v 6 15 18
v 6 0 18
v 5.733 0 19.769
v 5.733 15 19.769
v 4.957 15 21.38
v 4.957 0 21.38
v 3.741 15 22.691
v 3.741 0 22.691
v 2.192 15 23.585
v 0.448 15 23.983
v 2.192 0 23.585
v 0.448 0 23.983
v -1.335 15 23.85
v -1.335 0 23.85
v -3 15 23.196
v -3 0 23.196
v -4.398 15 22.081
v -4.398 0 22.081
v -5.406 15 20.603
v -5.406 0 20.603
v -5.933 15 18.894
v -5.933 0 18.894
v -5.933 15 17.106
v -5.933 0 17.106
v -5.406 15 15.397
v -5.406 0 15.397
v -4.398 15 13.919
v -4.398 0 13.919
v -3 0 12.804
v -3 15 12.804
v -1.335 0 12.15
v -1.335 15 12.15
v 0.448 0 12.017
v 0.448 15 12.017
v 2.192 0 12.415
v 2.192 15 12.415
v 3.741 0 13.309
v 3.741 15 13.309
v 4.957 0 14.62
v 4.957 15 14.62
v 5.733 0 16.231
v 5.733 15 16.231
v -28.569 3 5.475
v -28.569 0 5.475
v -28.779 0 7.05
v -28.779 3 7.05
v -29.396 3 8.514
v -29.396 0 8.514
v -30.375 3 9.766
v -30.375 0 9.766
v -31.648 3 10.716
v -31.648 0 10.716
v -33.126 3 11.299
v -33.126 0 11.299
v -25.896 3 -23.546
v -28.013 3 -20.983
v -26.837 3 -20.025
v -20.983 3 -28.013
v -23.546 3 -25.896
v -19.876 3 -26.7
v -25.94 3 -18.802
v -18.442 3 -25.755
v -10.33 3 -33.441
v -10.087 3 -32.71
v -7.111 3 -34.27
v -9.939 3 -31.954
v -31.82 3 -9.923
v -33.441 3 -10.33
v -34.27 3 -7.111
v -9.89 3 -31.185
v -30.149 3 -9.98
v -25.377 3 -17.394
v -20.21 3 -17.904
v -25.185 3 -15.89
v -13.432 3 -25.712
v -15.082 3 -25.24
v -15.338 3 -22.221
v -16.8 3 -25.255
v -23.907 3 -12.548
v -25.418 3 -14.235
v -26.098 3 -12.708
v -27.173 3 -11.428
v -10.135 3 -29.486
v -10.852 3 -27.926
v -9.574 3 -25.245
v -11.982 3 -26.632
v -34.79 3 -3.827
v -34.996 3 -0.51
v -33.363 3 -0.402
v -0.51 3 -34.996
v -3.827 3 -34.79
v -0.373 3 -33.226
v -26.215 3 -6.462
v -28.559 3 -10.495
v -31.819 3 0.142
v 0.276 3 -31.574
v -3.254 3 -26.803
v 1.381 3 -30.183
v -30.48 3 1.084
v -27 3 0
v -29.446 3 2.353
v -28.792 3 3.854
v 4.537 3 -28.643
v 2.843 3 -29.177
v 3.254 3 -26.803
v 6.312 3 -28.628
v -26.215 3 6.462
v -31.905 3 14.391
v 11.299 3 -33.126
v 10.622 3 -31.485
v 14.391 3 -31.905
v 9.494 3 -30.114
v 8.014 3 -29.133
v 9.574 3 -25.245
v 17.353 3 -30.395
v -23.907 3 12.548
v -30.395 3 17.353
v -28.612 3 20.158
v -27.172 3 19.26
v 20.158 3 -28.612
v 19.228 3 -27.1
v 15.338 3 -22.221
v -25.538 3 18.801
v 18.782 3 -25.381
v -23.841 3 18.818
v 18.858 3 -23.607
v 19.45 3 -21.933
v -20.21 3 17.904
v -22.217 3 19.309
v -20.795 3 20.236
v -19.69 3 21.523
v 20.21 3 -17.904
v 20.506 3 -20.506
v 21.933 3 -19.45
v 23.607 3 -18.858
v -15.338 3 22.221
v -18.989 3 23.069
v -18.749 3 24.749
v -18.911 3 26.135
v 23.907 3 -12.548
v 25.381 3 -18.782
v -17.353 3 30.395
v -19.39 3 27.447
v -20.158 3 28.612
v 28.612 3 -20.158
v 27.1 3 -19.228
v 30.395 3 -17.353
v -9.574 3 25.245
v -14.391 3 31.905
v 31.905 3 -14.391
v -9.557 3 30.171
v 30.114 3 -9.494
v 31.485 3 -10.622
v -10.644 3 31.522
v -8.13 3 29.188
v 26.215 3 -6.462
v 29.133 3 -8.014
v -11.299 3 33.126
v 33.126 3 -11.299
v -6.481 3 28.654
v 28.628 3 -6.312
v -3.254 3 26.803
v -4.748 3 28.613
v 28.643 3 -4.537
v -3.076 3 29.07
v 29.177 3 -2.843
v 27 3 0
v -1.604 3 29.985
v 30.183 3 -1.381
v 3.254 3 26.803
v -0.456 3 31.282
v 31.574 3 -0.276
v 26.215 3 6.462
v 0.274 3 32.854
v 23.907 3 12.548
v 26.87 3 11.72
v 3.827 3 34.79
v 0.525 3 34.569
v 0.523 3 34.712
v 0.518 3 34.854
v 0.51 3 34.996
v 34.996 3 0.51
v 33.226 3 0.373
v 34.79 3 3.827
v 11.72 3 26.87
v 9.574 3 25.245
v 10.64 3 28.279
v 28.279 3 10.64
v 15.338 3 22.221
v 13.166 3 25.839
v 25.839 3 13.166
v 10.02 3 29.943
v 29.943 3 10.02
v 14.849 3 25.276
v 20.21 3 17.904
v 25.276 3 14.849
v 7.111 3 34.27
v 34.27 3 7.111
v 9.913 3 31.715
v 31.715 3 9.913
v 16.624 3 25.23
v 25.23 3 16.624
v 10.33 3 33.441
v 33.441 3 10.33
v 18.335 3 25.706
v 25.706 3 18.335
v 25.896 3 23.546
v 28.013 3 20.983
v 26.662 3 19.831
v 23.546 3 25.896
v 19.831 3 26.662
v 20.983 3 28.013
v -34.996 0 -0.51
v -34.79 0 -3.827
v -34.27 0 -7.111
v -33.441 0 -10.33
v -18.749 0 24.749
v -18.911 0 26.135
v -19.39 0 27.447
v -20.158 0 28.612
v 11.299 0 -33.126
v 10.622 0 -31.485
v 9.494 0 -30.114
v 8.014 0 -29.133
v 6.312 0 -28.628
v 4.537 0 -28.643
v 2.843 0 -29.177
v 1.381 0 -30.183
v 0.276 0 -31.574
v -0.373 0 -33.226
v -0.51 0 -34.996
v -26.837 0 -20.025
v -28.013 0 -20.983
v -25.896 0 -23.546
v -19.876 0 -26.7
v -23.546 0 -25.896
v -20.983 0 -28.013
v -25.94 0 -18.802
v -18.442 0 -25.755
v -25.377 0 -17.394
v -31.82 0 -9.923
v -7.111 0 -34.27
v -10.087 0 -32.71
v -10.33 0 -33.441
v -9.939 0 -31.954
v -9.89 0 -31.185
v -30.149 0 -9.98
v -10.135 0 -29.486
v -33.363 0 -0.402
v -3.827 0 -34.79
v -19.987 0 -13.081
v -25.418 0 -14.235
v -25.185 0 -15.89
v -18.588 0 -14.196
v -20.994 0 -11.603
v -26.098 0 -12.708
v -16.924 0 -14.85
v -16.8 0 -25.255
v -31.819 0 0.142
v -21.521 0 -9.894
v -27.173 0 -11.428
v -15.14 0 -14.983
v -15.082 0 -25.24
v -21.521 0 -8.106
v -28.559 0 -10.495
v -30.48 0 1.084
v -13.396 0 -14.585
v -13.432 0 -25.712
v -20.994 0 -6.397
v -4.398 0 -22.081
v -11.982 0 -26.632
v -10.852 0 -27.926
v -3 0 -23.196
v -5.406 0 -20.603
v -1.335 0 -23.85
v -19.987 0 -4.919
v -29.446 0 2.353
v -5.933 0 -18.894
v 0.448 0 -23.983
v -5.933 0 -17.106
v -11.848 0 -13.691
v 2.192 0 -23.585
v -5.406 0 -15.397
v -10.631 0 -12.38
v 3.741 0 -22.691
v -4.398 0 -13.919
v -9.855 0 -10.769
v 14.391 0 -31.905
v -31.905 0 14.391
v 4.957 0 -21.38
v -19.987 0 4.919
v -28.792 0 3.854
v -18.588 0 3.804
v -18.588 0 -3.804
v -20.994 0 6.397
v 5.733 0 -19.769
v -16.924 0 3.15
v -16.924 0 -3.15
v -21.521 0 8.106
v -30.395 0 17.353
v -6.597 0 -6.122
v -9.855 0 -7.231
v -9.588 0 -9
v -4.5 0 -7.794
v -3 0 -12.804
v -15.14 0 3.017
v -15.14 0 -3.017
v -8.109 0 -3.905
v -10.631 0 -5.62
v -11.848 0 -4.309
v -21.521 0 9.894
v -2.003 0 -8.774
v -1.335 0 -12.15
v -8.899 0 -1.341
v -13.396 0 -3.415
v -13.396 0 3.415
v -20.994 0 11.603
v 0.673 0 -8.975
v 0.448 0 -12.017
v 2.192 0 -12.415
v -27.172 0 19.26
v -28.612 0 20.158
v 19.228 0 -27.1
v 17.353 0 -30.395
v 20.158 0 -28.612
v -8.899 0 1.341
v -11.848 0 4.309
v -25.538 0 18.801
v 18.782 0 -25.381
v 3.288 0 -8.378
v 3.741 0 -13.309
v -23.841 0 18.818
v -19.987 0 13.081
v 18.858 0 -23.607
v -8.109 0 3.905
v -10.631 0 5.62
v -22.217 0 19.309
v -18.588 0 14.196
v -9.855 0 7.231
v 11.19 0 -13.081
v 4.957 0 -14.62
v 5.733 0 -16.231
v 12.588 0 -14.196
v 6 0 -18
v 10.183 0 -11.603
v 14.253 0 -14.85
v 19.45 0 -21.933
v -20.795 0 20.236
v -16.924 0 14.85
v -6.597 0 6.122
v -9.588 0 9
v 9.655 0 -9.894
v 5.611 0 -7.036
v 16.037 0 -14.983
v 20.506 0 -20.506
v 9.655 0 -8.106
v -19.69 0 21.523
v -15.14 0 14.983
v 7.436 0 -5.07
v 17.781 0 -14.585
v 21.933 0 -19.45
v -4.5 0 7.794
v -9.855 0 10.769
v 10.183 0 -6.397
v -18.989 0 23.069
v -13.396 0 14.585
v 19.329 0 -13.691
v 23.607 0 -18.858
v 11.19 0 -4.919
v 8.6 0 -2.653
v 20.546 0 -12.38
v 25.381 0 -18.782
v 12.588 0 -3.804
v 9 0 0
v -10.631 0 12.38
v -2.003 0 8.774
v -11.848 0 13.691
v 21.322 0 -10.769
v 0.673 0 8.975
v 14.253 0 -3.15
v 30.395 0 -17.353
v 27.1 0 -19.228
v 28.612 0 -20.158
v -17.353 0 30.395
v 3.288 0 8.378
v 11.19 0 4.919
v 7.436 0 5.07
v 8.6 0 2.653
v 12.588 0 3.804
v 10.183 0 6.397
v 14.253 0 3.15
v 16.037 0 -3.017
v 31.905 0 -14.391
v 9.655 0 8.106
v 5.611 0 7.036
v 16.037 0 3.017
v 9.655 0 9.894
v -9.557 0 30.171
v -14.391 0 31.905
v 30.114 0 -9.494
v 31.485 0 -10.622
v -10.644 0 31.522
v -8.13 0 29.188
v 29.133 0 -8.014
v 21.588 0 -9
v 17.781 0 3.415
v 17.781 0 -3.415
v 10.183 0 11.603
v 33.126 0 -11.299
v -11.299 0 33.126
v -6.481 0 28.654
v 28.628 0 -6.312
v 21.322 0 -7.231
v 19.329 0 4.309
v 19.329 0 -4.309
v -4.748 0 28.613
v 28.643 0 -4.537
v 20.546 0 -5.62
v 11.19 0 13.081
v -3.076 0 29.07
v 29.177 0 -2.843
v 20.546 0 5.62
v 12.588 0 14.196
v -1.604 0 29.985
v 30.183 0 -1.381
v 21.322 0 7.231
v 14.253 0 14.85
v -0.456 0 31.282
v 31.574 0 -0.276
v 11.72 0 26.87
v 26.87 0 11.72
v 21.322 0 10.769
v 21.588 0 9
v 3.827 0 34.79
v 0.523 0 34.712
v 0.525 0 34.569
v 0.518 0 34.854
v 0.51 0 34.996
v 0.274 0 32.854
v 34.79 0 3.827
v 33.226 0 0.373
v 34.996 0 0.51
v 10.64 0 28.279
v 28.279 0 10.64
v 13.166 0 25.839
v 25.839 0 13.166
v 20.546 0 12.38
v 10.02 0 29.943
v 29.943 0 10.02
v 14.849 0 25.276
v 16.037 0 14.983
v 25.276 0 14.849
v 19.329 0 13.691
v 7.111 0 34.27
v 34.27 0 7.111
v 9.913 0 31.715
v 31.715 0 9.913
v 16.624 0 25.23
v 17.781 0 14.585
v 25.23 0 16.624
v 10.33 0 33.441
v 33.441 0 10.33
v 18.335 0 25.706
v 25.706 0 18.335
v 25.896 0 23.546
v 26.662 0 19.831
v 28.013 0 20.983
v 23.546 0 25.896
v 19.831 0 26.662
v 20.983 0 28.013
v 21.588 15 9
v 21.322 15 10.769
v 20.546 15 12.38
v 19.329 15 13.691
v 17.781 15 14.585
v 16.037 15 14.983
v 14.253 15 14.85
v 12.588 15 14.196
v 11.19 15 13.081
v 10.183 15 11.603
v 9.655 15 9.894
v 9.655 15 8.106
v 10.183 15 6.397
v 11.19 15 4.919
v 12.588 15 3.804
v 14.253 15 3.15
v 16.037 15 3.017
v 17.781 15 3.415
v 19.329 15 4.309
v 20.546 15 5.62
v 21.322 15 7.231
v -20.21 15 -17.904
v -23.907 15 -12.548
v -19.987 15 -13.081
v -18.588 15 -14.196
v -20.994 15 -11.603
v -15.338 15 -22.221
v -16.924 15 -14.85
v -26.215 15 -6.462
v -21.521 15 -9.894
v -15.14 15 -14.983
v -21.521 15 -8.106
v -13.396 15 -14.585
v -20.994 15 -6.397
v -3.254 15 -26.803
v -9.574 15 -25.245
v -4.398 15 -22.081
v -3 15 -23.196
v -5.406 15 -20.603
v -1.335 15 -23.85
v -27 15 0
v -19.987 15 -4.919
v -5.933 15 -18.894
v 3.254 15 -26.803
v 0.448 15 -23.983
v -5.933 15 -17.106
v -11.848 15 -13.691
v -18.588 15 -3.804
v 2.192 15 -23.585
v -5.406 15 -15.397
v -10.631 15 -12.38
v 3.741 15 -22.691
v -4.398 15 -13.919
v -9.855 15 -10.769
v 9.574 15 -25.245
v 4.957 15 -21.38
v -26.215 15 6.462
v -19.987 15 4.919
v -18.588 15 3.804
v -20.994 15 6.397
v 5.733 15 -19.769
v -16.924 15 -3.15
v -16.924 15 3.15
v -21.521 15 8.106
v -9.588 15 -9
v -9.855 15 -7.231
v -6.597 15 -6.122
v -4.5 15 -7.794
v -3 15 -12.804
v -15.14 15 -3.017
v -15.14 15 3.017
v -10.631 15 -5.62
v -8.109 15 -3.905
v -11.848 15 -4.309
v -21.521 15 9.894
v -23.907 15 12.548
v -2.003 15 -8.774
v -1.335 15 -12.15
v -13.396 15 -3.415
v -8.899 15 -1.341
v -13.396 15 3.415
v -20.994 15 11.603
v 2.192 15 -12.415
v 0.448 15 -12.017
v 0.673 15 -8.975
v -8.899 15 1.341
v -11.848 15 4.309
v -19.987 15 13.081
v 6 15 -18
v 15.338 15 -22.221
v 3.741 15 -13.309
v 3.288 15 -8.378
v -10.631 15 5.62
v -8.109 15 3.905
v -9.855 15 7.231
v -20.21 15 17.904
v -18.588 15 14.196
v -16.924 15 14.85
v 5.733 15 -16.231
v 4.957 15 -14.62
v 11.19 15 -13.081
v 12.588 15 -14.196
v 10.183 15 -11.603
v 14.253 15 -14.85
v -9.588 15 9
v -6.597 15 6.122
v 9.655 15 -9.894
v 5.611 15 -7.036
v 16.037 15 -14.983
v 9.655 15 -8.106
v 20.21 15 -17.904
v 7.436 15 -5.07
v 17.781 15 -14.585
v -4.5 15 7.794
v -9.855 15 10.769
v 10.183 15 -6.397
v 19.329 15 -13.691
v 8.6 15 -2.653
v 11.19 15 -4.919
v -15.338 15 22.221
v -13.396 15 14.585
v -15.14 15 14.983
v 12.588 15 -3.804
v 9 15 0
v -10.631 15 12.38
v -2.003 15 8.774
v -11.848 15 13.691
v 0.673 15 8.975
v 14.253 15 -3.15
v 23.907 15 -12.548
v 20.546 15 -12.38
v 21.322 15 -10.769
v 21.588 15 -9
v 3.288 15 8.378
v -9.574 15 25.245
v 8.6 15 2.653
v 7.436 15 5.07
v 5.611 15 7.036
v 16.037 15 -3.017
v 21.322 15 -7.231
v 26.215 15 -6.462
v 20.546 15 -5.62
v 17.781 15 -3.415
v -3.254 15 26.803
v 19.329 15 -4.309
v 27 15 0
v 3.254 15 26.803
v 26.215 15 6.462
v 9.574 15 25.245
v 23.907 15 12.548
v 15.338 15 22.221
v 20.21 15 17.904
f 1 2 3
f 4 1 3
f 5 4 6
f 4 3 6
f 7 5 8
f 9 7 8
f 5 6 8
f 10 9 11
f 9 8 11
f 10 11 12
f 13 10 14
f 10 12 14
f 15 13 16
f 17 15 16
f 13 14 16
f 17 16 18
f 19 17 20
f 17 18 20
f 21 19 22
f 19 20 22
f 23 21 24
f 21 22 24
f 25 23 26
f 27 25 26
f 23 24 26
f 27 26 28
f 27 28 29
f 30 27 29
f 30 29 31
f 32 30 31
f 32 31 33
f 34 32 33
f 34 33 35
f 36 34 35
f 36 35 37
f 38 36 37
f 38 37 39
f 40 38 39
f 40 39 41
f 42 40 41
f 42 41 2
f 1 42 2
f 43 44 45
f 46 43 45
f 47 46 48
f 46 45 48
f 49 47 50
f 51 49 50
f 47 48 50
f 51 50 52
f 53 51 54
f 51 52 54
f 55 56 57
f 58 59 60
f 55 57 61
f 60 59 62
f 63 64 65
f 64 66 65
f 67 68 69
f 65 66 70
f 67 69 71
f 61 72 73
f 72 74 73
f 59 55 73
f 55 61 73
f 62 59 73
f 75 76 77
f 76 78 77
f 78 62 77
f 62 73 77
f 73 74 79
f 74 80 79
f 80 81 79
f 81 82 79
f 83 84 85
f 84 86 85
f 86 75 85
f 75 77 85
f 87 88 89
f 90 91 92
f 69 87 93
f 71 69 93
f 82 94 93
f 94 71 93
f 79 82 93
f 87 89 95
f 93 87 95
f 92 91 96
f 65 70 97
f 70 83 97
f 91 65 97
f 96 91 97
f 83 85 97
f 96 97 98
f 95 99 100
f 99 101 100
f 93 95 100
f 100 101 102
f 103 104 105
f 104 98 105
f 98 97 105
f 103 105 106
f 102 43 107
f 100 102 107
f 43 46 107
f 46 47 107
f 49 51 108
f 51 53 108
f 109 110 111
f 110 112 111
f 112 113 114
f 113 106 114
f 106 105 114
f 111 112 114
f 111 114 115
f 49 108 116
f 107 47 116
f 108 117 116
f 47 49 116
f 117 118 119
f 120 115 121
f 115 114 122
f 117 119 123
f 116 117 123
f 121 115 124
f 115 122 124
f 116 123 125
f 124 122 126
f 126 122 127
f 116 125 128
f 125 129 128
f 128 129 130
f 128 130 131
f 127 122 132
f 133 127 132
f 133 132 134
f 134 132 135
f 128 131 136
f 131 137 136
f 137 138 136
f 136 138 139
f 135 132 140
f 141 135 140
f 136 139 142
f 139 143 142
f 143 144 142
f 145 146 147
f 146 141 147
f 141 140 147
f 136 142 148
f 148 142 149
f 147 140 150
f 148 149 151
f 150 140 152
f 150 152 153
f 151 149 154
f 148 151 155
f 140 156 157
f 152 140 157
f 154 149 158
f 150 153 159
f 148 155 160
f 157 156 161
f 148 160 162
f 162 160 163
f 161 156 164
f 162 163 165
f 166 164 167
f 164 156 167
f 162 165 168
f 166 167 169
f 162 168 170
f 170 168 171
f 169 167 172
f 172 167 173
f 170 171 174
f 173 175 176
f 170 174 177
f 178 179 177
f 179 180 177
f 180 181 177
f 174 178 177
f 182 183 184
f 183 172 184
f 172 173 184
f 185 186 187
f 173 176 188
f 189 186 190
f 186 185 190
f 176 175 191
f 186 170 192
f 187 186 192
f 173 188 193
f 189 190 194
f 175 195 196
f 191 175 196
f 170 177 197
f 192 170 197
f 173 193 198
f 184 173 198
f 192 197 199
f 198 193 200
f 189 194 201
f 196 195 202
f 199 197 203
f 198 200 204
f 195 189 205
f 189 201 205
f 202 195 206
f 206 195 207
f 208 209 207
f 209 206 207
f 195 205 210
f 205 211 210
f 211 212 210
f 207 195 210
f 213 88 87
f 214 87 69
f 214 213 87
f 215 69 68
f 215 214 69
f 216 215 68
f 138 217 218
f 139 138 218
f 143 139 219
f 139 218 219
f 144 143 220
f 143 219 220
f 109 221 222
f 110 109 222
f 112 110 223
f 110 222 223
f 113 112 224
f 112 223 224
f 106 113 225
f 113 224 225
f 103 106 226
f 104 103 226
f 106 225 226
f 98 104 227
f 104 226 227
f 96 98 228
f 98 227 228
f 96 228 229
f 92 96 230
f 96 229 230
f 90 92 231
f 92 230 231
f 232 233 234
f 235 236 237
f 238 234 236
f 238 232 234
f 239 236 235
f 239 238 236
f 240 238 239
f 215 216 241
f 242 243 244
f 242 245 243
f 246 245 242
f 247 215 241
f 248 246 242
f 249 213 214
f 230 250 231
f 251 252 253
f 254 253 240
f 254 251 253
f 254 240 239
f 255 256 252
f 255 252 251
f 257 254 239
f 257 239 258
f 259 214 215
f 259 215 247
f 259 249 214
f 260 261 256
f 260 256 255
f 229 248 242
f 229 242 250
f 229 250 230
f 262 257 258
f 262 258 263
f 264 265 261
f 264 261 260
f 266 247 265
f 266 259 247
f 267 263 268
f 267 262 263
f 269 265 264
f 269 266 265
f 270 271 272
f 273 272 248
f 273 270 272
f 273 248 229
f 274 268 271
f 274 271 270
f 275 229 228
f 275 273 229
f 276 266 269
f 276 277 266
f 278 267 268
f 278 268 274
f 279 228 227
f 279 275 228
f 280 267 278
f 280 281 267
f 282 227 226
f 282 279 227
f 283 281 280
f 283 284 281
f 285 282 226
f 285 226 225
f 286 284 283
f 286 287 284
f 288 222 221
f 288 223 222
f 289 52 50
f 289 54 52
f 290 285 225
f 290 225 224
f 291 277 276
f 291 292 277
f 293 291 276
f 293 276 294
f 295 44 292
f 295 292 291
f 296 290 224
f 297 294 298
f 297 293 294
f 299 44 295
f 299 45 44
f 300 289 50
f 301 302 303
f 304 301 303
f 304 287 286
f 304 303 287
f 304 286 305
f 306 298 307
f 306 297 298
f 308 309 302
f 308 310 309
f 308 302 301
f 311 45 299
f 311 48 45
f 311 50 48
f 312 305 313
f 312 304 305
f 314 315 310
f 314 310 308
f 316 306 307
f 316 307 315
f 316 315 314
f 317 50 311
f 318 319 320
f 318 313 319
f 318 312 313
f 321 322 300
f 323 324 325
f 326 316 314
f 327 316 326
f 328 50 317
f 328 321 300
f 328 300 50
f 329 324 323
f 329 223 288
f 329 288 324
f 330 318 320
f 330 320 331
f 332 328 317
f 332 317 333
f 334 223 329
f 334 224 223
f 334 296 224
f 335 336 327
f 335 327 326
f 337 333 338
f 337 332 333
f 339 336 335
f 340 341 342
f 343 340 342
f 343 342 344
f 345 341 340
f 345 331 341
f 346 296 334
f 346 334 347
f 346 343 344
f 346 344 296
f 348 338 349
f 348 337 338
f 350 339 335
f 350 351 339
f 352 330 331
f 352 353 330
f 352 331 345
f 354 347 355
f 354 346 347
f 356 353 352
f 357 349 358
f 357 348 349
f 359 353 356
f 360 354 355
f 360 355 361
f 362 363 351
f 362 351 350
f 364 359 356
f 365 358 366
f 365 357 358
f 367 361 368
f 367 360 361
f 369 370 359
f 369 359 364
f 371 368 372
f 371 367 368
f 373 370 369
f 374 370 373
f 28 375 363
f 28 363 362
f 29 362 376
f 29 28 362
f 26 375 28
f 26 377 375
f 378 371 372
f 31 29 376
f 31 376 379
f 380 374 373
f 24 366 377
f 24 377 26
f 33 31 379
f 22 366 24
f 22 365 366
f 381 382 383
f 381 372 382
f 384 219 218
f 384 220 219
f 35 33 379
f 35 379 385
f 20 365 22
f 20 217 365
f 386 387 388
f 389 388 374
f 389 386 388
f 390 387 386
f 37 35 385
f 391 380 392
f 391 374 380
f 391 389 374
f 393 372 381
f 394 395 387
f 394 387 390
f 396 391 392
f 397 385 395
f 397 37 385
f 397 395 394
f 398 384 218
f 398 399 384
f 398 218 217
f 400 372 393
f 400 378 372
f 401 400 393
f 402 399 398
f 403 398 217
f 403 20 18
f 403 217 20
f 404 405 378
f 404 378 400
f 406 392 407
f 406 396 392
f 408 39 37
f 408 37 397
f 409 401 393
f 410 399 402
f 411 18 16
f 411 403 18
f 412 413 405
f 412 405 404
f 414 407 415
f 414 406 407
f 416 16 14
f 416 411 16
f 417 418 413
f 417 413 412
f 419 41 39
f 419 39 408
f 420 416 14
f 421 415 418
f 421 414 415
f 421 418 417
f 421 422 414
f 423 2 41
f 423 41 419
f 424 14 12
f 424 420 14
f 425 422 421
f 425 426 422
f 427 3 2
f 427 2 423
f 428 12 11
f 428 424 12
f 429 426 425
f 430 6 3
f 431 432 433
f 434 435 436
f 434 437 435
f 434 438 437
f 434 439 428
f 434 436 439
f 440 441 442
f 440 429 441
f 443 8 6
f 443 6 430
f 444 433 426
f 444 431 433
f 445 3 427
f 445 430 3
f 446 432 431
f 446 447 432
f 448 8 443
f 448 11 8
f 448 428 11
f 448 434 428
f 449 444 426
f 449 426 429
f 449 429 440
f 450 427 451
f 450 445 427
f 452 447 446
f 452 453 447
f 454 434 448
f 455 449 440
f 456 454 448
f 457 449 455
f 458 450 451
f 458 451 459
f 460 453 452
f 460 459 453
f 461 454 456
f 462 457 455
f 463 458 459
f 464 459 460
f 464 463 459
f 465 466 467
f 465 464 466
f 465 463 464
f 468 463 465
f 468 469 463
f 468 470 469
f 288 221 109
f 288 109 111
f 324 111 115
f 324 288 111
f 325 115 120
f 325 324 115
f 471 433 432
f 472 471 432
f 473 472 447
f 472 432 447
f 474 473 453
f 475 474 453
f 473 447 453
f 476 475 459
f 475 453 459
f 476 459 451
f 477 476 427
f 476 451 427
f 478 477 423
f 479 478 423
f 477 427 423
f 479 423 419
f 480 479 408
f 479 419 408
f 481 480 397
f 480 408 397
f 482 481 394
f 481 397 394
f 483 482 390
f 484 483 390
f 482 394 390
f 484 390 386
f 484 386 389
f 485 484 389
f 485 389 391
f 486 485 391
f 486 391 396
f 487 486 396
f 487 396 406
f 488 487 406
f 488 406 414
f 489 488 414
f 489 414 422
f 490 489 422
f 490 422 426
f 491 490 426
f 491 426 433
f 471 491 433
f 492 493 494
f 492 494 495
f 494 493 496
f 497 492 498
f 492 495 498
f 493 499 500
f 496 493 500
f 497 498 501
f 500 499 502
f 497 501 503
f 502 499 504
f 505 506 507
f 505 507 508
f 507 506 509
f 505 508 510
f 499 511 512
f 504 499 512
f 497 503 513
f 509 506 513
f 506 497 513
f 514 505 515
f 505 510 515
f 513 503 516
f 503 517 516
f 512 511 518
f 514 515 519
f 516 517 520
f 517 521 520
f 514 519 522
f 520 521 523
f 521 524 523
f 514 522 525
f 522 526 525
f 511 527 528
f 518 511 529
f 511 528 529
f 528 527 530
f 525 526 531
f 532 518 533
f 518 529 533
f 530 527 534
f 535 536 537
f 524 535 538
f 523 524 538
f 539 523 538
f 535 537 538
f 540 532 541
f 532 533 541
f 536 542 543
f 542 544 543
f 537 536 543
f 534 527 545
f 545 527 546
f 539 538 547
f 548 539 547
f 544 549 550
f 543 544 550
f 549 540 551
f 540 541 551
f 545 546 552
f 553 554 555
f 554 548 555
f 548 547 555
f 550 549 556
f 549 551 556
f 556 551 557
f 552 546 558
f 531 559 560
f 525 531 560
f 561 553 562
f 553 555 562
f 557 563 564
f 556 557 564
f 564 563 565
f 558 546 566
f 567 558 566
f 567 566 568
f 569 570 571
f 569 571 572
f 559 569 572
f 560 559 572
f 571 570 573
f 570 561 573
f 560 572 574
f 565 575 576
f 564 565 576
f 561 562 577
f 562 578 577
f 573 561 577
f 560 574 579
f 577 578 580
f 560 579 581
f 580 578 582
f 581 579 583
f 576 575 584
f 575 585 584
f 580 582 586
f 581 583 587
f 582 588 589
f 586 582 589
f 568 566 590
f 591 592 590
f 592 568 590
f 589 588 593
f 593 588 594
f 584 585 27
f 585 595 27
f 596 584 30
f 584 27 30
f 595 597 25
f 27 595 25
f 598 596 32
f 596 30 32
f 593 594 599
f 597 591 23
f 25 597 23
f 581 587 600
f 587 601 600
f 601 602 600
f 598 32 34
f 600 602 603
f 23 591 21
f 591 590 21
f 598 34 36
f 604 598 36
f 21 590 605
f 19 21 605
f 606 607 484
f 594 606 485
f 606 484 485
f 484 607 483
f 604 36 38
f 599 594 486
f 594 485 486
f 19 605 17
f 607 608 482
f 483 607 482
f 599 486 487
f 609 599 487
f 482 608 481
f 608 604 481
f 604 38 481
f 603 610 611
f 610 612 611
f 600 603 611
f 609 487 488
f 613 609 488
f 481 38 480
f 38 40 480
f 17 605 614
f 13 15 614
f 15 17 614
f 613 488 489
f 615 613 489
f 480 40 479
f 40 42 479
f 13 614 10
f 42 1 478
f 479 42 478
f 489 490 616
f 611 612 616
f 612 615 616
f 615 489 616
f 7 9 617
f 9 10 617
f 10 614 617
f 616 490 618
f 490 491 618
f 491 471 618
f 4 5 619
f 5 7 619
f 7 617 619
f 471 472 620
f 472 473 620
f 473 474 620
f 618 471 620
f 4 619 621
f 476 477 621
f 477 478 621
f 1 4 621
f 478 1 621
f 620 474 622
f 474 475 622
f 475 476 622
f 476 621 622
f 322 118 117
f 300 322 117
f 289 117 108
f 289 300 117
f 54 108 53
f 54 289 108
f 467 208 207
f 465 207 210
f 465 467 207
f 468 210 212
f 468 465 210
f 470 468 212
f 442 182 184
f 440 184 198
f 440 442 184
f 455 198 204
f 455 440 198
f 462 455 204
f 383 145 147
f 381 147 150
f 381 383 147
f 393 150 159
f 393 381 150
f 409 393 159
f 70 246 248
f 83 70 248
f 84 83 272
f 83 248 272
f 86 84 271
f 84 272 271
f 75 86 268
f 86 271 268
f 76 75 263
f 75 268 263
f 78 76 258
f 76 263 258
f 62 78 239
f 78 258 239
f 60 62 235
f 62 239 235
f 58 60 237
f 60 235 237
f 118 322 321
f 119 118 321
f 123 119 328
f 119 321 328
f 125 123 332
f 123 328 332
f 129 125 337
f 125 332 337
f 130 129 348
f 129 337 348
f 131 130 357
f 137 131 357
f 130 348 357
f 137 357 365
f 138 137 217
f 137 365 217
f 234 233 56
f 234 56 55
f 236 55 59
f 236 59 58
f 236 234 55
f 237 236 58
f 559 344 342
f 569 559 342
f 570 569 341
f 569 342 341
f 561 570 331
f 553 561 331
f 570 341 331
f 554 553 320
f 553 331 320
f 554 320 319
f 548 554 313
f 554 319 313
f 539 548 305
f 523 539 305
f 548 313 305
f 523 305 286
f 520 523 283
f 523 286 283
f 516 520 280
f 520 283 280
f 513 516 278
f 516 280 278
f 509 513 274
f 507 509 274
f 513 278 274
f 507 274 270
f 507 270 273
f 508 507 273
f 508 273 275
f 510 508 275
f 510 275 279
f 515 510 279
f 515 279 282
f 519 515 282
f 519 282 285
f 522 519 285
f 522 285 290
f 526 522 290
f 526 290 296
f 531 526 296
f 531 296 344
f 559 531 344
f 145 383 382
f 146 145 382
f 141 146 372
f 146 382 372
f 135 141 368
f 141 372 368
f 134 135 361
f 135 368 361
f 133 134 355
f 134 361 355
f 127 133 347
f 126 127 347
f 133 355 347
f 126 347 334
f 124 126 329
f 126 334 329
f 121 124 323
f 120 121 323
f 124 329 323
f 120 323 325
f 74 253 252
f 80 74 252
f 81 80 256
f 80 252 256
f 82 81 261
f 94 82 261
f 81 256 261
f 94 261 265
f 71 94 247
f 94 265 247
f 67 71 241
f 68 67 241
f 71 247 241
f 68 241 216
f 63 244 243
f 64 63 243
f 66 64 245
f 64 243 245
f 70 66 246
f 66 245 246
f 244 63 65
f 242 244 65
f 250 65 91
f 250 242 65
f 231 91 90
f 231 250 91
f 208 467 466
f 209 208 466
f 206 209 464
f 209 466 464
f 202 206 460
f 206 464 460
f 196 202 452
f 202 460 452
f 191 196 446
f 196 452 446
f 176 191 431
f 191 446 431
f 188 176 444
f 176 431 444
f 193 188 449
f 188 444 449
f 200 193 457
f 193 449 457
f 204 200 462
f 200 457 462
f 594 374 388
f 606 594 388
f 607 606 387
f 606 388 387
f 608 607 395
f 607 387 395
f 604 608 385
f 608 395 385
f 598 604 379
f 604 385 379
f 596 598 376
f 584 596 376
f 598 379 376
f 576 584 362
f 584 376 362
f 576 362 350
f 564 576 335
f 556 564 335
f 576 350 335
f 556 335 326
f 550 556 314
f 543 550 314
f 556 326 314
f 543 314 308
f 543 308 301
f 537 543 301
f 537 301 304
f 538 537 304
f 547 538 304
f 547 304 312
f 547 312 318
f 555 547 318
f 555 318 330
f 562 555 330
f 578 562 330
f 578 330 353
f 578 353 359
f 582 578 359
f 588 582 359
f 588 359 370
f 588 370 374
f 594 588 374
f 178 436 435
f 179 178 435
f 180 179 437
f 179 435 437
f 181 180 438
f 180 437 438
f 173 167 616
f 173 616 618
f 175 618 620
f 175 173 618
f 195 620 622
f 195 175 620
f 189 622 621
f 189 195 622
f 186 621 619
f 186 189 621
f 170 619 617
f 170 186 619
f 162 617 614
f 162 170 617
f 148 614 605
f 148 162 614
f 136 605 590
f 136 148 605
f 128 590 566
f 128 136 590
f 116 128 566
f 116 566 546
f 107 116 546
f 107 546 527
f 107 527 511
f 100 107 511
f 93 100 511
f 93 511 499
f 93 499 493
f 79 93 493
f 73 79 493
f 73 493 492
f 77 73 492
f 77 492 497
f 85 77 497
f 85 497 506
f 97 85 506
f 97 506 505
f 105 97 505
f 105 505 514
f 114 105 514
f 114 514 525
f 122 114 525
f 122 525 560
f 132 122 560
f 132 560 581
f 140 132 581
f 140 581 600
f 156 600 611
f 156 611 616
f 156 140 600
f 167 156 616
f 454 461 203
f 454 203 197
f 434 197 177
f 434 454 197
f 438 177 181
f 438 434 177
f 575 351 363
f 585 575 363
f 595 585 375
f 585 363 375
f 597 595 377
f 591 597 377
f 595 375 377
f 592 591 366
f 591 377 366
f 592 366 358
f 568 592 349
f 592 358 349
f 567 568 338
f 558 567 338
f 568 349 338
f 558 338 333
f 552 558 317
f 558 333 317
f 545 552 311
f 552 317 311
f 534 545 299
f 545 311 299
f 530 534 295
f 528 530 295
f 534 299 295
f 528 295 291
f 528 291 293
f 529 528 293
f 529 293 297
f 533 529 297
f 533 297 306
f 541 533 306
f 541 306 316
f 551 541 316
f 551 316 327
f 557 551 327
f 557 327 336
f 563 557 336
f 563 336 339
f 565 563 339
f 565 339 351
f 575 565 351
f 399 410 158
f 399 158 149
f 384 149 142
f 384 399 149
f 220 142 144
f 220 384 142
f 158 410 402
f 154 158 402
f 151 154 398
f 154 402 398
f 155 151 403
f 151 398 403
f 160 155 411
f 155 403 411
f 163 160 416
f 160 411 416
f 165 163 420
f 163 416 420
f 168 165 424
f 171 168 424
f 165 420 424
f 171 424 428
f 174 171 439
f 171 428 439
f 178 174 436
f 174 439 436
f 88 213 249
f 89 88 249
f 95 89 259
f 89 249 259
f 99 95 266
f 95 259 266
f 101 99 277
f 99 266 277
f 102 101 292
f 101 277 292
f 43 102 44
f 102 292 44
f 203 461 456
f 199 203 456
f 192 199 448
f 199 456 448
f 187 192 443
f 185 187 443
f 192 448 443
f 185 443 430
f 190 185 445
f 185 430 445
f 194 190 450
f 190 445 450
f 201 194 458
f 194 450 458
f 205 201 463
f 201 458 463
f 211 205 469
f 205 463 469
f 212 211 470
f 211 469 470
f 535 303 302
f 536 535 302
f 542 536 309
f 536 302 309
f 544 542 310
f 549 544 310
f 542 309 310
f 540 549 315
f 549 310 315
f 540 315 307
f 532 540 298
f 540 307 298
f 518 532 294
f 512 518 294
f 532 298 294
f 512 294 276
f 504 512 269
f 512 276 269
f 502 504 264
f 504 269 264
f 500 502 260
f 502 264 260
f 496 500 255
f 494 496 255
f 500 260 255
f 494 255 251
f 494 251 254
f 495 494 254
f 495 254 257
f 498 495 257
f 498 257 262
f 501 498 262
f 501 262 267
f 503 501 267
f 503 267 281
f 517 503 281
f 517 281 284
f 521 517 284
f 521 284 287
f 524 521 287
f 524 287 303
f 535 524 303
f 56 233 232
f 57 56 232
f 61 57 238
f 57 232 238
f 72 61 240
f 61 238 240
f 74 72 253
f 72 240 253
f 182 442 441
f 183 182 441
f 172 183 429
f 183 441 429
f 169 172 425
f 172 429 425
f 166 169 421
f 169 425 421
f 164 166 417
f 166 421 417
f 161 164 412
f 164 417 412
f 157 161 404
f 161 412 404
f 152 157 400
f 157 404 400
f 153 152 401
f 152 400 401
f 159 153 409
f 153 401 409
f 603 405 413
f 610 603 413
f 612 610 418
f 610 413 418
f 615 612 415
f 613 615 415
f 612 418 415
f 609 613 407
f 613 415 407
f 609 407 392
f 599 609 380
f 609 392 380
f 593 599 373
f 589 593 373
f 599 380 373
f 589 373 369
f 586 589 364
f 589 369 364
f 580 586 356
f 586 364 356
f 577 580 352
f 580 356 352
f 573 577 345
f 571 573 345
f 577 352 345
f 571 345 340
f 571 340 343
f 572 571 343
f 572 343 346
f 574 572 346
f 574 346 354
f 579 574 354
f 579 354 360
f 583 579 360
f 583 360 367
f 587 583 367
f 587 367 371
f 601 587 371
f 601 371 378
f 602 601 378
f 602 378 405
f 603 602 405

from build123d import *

# Parameters (mm, degrees)
F0_R     = 27
F1_DEPTH = 15
F2_R     = 35
F2_R_2   = 27
F3_DEPTH = 3
F4_R     = 9
F5_DEPTH = 15.001
F6_R     = 6
F7_DEPTH = 15.001


with BuildPart() as f1:
    # F0 (on Front) → F1 (new body)
    with BuildSketch(Plane.XZ):
        Circle(F0_R)
    extrude(amount=-F1_DEPTH)

    # F2 (on face) → F3 (join)
    with BuildSketch(Plane.XZ):
        Circle(F2_R)
        Circle(F2_R_2, mode=Mode.SUBTRACT)
    extrude(amount=-F3_DEPTH)

    # F4 (on face) → F5 (cut, through all)
    with BuildSketch(Plane.XZ):
        Circle(F4_R)
    extrude(amount=-F5_DEPTH, mode=Mode.SUBTRACT)

    # F6 (on face) → F7 (cut, through all)
    with BuildSketch(Plane.XZ):
        with Locations((0, 18)):
            Circle(F6_R)
        with Locations((-15.5884572681, 9)):
            Circle(F6_R)
        with Locations((-15.5884572681, -9)):
            Circle(F6_R)
        with Locations((0, -18)):
            Circle(F6_R)
        with BuildLine():
            ThreePointArc((-28.6121091704, 20.1580556806), (-22.2169623686, 19.3090576187), (-18.7487373415, 24.7487373415))
            ThreePointArc((-18.7487373415, 24.7487373415), (-19.1120676703, 26.8049365092), (-20.1580556806, 28.6121091704))
            ThreePointArc((-20.1580556806, 28.6121091704), (-24.7487373415, 24.7487373415), (-28.6121091704, 20.1580556806))
        make_face()
        with BuildLine():
            ThreePointArc((0.5095661882, 34.9962904077), (-5.4752062764, 34.5690919208), (-11.2990747198, 33.1259854265))
            ThreePointArc((-11.2990747198, 33.1259854265), (-4.7482986689, 28.6132875813), (0.5247937236, 34.5690919208))
            ThreePointArc((0.5247937236, 34.5690919208), (0.5209856313, 34.782826818), (0.5095661882, 34.9962904077))
        make_face()
        with BuildLine():
            ThreePointArc((-34.9962904077, -0.5095661882), (-34.5690919208, 5.4752062764), (-33.1259854265, 11.2990747198))
            ThreePointArc((-33.1259854265, 11.2990747198), (-40.4952219644, 6.4138130666), (-34.9962904077, -0.5095661882))
        make_face()
        with BuildLine():
            ThreePointArc((-28.5690919208, 5.4752062764), (-29.8437009864, 9.1725946137), (-33.1259854265, 11.2990747198))
            ThreePointArc((-33.1259854265, 11.2990747198), (-34.5690919208, 5.4752062764), (-34.9962904077, -0.5095661882))
            ThreePointArc((-34.9962904077, -0.5095661882), (-30.4802773568, 1.084124922), (-28.5690919208, 5.4752062764))
        make_face()
        with BuildLine():
            ThreePointArc((20.9825510926, 28.0130781894), (15.8896674909, 31.1852283466), (10.3298222323, 33.4409146503))
            ThreePointArc((10.3298222323, 33.4409146503), (13.1657244924, 25.8391892015), (20.9825510926, 28.0130781894))
        make_face()
        with BuildLine():
            ThreePointArc((-25.1852283466, -15.8896674909), (-27.8336703374, -10.9130161156), (-33.4409146503, -10.3298222323))
            ThreePointArc((-33.4409146503, -10.3298222323), (-31.1852283466, -15.8896674909), (-28.0130781894, -20.9825510926))
            ThreePointArc((-28.0130781894, -20.9825510926), (-25.9396158493, -18.8023208394), (-25.1852283466, -15.8896674909))
        make_face()
        with BuildLine():
            ThreePointArc((33.4409146503, 10.3298222323), (31.1852283466, 15.8896674909), (28.0130781894, 20.9825510926))
            ThreePointArc((28.0130781894, 20.9825510926), (25.8391892015, 13.1657244924), (33.4409146503, 10.3298222323))
        make_face()
        with BuildLine():
            ThreePointArc((37.1852283466, 15.8896674909), (34.0978816951, 21.1352799882), (28.0130781894, 20.9825510926))
            ThreePointArc((28.0130781894, 20.9825510926), (31.1852283466, 15.8896674909), (33.4409146503, 10.3298222323))
            ThreePointArc((33.4409146503, 10.3298222323), (36.1618797219, 12.5381094817), (37.1852283466, 15.8896674909))
        make_face()
        with BuildLine():
            ThreePointArc((-9.8896674909, -31.1852283466), (-14.2400162566, -25.4164632443), (-20.9825510926, -28.0130781894))
            ThreePointArc((-20.9825510926, -28.0130781894), (-15.8896674909, -31.1852283466), (-10.3298222323, -33.4409146503))
            ThreePointArc((-10.3298222323, -33.4409146503), (-10.00073416, -32.3343428858), (-9.8896674909, -31.1852283466))
        make_face()
        with BuildLine():
            ThreePointArc((35, 0), (34.9990725896, 0.2547898454), (34.9962904077, 0.5095661882))
            ThreePointArc((34.9962904077, 0.5095661882), (28.6429618773, -4.5365994862), (33.1259854265, -11.2990747198))
            ThreePointArc((33.1259854265, -11.2990747198), (34.5283180153, -5.726714157), (35, 0))
        make_face()
        with BuildLine():
            ThreePointArc((40.5690919208, -5.4752062764), (38.9601732752, -1.3863917123), (34.9962904077, 0.5095661882))
            ThreePointArc((34.9962904077, 0.5095661882), (34.9990725896, 0.2547898454), (35, 0))
            ThreePointArc((35, 0), (34.5283180153, -5.726714157), (33.1259854265, -11.2990747198))
            ThreePointArc((33.1259854265, -11.2990747198), (38.2664802582, -10.2005972108), (40.5690919208, -5.4752062764))
        make_face()
        with BuildLine():
            ThreePointArc((11.2990747198, -33.1259854265), (4.5365994862, -28.6429618773), (-0.5095661882, -34.9962904077))
            ThreePointArc((-0.5095661882, -34.9962904077), (5.4752062764, -34.5690919208), (11.2990747198, -33.1259854265))
        make_face()
        with BuildLine():
            ThreePointArc((20.1580556806, -28.6121091704), (24.7487373415, -24.7487373415), (28.6121091704, -20.1580556806))
            ThreePointArc((28.6121091704, -20.1580556806), (20.5060966544, -20.5060966544), (20.1580556806, -28.6121091704))
        make_face()
        with Locations((15.5884572681, -9)):
            Circle(F6_R)
        with Locations((15.5884572681, 9)):
            Circle(F6_R)
    extrude(amount=-F7_DEPTH, mode=Mode.SUBTRACT)


solid = f1.part
